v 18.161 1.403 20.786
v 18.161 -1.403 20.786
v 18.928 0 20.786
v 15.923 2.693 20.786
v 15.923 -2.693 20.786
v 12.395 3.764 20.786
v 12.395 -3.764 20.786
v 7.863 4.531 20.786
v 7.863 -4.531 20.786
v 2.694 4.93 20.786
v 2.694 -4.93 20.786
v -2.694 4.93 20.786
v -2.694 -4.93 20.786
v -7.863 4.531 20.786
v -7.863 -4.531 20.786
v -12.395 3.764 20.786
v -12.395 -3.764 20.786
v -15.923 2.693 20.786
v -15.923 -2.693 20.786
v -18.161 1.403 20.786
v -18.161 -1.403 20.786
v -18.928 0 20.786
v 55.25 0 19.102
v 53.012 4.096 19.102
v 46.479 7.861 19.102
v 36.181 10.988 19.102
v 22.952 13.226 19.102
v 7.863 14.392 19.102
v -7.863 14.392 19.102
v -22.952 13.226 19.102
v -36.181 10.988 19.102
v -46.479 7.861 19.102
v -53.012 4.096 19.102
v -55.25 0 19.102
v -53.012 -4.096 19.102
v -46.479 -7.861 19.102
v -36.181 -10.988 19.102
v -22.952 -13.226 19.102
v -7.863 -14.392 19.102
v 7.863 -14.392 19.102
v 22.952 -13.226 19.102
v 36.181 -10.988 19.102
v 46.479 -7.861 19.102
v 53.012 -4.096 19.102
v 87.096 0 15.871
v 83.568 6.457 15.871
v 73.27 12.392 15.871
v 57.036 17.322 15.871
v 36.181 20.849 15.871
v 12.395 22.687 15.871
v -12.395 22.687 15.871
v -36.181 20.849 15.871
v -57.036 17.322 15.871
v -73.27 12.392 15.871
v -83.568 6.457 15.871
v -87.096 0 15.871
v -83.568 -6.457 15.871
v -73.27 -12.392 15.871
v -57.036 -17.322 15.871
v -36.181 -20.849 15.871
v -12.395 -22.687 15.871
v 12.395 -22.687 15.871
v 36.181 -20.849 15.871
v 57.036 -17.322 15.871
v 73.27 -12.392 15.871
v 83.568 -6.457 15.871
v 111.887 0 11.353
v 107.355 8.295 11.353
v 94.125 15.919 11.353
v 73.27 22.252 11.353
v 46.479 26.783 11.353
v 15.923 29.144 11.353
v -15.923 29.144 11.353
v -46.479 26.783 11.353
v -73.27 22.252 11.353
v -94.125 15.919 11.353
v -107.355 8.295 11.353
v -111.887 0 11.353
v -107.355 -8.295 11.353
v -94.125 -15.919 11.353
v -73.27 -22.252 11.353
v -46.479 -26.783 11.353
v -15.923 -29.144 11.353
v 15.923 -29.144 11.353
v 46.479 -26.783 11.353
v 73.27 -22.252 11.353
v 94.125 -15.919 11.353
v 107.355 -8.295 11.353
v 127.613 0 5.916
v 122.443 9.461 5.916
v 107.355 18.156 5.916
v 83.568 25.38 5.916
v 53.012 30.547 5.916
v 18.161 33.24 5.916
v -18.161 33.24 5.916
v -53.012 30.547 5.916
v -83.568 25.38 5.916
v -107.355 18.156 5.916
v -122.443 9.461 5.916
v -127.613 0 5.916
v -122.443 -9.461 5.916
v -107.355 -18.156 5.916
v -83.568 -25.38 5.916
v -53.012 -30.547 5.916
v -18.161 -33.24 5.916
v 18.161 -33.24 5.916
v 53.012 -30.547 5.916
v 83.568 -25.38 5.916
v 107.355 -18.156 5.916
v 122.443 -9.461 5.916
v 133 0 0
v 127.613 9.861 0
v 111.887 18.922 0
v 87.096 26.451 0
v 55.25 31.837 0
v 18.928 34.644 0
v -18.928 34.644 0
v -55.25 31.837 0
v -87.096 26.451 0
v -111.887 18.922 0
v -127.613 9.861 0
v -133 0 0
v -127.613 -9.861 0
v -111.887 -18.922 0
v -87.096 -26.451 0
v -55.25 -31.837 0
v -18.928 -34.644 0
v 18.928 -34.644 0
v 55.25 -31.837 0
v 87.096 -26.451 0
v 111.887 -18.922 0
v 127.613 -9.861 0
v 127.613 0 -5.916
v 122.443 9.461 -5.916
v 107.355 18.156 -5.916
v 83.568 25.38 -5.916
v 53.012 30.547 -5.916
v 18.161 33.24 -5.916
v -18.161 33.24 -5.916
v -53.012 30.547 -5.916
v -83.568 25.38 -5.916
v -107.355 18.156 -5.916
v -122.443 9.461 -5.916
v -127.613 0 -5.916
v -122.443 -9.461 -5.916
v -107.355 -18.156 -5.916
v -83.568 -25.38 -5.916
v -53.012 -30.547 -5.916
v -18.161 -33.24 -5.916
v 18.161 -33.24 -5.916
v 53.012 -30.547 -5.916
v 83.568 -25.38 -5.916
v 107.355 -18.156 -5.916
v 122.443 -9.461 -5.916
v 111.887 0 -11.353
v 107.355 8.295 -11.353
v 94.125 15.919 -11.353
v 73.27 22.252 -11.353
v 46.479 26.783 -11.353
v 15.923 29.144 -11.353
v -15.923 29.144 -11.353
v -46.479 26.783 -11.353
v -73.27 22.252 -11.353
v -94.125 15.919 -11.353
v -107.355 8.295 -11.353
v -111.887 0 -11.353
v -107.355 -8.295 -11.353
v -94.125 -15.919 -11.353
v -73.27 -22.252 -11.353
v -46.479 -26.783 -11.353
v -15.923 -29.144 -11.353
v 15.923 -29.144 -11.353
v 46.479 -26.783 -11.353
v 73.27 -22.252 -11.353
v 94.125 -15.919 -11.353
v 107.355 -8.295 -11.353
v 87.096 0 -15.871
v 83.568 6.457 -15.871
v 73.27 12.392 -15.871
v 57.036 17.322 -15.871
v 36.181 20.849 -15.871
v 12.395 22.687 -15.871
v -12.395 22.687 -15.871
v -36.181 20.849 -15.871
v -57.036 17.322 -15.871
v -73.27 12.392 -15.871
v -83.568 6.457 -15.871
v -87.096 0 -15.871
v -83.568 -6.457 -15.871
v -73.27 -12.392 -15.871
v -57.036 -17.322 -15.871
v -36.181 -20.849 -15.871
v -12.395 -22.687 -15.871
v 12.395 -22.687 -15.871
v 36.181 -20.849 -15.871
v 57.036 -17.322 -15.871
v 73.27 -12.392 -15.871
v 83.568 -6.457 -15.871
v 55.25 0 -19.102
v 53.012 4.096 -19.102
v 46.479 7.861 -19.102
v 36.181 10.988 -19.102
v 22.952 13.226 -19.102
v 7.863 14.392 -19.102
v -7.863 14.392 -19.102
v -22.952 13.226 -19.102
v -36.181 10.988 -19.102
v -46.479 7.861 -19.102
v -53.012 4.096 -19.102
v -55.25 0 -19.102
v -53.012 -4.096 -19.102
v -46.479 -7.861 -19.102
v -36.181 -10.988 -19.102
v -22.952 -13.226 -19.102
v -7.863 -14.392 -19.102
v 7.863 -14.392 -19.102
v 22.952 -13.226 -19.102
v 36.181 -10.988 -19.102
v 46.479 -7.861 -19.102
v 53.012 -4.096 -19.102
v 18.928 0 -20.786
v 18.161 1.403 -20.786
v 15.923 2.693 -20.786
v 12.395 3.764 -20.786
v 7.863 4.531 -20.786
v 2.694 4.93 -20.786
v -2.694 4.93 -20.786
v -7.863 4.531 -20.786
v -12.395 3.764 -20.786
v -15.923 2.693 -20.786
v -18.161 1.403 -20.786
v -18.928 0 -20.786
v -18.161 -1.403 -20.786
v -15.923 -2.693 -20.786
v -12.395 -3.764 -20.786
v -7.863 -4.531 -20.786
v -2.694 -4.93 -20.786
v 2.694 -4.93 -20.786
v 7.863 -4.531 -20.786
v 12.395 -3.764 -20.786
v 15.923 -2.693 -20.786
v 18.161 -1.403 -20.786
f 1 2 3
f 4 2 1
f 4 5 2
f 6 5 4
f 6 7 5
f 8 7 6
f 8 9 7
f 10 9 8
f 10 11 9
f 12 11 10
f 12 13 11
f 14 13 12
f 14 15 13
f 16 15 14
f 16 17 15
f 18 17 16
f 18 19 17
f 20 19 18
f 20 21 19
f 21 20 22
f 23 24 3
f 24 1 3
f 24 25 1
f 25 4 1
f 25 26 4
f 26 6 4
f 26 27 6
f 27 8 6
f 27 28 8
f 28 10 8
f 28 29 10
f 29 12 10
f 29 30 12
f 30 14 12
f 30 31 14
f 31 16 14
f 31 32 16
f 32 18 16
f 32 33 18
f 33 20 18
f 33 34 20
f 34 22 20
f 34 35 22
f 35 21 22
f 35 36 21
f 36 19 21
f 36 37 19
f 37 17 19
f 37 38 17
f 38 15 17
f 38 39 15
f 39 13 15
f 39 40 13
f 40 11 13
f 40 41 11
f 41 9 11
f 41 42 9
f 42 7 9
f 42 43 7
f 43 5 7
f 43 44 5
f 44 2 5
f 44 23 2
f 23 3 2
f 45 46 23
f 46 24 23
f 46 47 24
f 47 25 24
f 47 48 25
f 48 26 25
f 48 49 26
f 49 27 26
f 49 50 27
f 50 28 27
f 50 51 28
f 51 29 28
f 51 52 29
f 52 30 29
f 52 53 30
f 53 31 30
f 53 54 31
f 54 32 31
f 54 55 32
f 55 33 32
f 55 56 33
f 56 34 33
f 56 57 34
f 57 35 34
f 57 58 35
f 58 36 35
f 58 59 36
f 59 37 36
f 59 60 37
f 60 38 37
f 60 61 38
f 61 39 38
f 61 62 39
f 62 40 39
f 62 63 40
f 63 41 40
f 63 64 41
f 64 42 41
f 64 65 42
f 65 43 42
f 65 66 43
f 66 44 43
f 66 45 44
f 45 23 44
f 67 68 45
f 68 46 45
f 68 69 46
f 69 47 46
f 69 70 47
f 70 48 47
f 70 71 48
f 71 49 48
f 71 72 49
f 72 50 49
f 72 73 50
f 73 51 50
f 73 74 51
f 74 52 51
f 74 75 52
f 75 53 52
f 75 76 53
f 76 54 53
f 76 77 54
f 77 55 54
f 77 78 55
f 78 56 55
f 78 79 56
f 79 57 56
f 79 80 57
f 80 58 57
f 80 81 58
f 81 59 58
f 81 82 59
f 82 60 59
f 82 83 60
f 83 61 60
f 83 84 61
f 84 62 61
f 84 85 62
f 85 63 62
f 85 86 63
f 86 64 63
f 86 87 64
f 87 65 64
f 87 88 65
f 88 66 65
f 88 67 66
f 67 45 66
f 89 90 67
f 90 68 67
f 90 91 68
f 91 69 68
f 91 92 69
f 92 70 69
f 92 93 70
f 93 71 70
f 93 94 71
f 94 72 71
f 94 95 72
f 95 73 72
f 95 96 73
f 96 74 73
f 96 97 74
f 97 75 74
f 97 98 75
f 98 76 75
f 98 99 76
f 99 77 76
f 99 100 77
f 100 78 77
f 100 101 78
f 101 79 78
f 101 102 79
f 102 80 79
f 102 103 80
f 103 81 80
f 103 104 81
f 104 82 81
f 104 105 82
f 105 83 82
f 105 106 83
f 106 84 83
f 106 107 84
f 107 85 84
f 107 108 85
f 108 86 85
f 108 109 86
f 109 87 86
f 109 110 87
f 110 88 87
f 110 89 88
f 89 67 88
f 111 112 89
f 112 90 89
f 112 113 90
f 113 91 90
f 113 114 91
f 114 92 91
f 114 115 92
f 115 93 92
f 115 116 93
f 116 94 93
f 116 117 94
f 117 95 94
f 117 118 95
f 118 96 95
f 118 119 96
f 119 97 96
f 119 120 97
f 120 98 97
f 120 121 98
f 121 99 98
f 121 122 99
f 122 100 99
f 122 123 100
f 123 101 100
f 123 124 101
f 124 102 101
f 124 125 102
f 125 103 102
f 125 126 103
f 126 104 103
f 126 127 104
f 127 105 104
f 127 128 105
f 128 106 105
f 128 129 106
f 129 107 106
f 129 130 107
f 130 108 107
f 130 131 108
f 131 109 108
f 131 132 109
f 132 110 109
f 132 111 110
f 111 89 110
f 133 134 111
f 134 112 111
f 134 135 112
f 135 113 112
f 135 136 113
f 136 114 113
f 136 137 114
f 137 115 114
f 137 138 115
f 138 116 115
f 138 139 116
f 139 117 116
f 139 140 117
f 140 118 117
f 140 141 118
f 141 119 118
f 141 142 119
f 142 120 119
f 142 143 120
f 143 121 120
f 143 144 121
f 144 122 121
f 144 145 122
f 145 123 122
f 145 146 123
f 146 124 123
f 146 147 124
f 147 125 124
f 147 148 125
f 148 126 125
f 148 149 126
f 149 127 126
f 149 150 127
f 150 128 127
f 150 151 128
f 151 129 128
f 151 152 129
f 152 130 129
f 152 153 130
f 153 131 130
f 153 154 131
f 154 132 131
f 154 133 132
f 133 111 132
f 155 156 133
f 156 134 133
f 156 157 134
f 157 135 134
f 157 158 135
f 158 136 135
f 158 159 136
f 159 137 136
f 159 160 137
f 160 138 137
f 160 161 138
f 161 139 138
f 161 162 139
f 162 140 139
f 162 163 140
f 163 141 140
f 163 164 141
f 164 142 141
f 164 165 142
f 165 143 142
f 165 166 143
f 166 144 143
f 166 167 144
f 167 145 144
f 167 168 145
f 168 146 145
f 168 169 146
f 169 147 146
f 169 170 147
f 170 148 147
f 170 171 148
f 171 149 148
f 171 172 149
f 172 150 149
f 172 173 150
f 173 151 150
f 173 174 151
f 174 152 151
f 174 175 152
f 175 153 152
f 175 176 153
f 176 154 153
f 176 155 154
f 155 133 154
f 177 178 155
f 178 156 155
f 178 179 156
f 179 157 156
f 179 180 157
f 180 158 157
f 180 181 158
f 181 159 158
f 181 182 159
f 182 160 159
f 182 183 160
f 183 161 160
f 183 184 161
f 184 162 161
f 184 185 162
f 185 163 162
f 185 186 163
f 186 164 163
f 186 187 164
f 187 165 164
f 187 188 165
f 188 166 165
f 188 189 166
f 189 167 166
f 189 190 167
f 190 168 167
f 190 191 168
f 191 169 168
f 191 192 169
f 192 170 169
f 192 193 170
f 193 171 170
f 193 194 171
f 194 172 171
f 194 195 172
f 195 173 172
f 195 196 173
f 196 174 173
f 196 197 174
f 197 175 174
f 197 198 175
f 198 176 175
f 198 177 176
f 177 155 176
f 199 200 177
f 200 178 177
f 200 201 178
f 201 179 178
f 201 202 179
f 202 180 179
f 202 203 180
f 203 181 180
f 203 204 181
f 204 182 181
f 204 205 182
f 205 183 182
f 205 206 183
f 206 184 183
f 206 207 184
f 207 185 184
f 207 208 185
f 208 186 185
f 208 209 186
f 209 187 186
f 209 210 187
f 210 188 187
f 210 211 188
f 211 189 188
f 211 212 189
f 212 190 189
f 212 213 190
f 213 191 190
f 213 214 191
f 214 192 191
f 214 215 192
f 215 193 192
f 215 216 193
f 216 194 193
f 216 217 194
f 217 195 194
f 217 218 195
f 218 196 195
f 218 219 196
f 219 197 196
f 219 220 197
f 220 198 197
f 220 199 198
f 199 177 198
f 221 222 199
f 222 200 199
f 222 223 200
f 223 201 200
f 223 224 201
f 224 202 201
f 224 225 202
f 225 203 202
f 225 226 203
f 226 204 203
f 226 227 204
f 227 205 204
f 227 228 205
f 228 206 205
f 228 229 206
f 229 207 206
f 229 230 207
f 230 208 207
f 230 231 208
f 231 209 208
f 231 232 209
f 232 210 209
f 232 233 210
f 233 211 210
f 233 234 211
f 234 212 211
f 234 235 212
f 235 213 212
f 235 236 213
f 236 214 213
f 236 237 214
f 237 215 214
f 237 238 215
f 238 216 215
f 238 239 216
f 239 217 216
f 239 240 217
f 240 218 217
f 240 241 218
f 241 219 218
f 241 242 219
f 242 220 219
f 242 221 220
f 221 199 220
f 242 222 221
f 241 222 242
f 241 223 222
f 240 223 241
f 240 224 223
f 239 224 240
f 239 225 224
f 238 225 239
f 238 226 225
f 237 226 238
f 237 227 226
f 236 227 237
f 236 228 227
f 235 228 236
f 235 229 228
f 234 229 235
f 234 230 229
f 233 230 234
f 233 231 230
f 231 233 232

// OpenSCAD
// Generated by SolidPython 1.0.1 on 2020-07-29 00:46:53


scale(v = [19, 5, 3]) {
	sphere(r = 7);
}
/***********************************************
*********      SolidPython code:      **********
************************************************
 
# import packages: SolidPython
from solid import *
from solid.utils import *
from itertools import chain, combinations, permutations


class Resize:

    def __init__(self, scad_file):
        self.scad_file = scad_file
        #self.scad_file = import_scad(scad_file)
        # cone/cylinder param:
        self.r1 = 0
        self.r2 = 0
        self.h = 0
        # rectangular prism param:
        self.w = 0
        self.l = 0
        # ellipse param:
        self.r = 0

    # import OpenScad code (file name corresponds to shape)


    # classify shape + parameters
    def assign(self, param1, param2, param3):
        if self.scad_file == 'cone.scad':
            self.r1 = param1
            self.r2 = param2
            self.h = param3
        elif self.scad_file == 'cylinder.scad':
            self.r1 = param1
            self.r2 = param2
            self.h = param3
        elif self.scad_file == 'rectangularPrism.scad':
            self.h = param1
            self.l = param2
            self.w = param3
        else:
            self.r = param1
            self.h = param2

    # resize parameters
    def iterate(self):
        x = range(3, 20, 2)
        i = 1
        if self.scad_file == 'cone.scad':
            tempList = list(permutations(x, 2))
            for temp in tempList:
                param1 = temp[0]
                param2 = temp[1]
                filepath = 'produced_scad_files/' + 'cone' + str(param1) + '_' + str(param2) + '_' + '.scad'
                scad_render_to_file(cylinder(h=param1, r1=param2, r2=0), filepath)

        elif self.scad_file == 'cylinder.scad':
            tempList = list(permutations(x, 3))
            for temp in tempList:
                param1 = temp[0]
                param2 = temp[1]
                filepath = 'produced_scad_files/' + 'cylinder' + str(param1) + '_' + str(param2) + '_' + '.scad'
                scad_render_to_file(cylinder(h=param1, r1=param2, r2=param2), filepath)

        elif self.scad_file == 'rectangularPrism.scad':
            tempList = list(permutations(x, 3))
            for temp in tempList:
                param1 = temp[0]
                param2 = temp[1]
                param3 = temp[2]
                filepath = 'produced_scad_files/' + 'rectangularPrism' + str(param1) + '_' + str(param2) + '_' + str(
                    param3) + '.scad'
                scad_render_to_file(cube(size=(param1, param2, param3)), filepath)

        elif self.scad_file == 'ellipse.scad':
            tempList = list(permutations(x, 4))
            for temp in tempList:
                param1 = temp[0]
                param2 = temp[1]
                param3 = temp[2]
                param4 = temp[3]
                filepath = 'produced_scad_files/' + 'ellipse' + str(param1) + '_' + str(param2) + '_' + str(param3) + '_' + str(param4) + '.scad'
                scad_render_to_file(scale([param1, param2, param3])(sphere(r=param4)), filepath)

    def render_to_scadfile(self):
        scad_render_to_file(scad, 'example.scad') 
 
************************************************/
